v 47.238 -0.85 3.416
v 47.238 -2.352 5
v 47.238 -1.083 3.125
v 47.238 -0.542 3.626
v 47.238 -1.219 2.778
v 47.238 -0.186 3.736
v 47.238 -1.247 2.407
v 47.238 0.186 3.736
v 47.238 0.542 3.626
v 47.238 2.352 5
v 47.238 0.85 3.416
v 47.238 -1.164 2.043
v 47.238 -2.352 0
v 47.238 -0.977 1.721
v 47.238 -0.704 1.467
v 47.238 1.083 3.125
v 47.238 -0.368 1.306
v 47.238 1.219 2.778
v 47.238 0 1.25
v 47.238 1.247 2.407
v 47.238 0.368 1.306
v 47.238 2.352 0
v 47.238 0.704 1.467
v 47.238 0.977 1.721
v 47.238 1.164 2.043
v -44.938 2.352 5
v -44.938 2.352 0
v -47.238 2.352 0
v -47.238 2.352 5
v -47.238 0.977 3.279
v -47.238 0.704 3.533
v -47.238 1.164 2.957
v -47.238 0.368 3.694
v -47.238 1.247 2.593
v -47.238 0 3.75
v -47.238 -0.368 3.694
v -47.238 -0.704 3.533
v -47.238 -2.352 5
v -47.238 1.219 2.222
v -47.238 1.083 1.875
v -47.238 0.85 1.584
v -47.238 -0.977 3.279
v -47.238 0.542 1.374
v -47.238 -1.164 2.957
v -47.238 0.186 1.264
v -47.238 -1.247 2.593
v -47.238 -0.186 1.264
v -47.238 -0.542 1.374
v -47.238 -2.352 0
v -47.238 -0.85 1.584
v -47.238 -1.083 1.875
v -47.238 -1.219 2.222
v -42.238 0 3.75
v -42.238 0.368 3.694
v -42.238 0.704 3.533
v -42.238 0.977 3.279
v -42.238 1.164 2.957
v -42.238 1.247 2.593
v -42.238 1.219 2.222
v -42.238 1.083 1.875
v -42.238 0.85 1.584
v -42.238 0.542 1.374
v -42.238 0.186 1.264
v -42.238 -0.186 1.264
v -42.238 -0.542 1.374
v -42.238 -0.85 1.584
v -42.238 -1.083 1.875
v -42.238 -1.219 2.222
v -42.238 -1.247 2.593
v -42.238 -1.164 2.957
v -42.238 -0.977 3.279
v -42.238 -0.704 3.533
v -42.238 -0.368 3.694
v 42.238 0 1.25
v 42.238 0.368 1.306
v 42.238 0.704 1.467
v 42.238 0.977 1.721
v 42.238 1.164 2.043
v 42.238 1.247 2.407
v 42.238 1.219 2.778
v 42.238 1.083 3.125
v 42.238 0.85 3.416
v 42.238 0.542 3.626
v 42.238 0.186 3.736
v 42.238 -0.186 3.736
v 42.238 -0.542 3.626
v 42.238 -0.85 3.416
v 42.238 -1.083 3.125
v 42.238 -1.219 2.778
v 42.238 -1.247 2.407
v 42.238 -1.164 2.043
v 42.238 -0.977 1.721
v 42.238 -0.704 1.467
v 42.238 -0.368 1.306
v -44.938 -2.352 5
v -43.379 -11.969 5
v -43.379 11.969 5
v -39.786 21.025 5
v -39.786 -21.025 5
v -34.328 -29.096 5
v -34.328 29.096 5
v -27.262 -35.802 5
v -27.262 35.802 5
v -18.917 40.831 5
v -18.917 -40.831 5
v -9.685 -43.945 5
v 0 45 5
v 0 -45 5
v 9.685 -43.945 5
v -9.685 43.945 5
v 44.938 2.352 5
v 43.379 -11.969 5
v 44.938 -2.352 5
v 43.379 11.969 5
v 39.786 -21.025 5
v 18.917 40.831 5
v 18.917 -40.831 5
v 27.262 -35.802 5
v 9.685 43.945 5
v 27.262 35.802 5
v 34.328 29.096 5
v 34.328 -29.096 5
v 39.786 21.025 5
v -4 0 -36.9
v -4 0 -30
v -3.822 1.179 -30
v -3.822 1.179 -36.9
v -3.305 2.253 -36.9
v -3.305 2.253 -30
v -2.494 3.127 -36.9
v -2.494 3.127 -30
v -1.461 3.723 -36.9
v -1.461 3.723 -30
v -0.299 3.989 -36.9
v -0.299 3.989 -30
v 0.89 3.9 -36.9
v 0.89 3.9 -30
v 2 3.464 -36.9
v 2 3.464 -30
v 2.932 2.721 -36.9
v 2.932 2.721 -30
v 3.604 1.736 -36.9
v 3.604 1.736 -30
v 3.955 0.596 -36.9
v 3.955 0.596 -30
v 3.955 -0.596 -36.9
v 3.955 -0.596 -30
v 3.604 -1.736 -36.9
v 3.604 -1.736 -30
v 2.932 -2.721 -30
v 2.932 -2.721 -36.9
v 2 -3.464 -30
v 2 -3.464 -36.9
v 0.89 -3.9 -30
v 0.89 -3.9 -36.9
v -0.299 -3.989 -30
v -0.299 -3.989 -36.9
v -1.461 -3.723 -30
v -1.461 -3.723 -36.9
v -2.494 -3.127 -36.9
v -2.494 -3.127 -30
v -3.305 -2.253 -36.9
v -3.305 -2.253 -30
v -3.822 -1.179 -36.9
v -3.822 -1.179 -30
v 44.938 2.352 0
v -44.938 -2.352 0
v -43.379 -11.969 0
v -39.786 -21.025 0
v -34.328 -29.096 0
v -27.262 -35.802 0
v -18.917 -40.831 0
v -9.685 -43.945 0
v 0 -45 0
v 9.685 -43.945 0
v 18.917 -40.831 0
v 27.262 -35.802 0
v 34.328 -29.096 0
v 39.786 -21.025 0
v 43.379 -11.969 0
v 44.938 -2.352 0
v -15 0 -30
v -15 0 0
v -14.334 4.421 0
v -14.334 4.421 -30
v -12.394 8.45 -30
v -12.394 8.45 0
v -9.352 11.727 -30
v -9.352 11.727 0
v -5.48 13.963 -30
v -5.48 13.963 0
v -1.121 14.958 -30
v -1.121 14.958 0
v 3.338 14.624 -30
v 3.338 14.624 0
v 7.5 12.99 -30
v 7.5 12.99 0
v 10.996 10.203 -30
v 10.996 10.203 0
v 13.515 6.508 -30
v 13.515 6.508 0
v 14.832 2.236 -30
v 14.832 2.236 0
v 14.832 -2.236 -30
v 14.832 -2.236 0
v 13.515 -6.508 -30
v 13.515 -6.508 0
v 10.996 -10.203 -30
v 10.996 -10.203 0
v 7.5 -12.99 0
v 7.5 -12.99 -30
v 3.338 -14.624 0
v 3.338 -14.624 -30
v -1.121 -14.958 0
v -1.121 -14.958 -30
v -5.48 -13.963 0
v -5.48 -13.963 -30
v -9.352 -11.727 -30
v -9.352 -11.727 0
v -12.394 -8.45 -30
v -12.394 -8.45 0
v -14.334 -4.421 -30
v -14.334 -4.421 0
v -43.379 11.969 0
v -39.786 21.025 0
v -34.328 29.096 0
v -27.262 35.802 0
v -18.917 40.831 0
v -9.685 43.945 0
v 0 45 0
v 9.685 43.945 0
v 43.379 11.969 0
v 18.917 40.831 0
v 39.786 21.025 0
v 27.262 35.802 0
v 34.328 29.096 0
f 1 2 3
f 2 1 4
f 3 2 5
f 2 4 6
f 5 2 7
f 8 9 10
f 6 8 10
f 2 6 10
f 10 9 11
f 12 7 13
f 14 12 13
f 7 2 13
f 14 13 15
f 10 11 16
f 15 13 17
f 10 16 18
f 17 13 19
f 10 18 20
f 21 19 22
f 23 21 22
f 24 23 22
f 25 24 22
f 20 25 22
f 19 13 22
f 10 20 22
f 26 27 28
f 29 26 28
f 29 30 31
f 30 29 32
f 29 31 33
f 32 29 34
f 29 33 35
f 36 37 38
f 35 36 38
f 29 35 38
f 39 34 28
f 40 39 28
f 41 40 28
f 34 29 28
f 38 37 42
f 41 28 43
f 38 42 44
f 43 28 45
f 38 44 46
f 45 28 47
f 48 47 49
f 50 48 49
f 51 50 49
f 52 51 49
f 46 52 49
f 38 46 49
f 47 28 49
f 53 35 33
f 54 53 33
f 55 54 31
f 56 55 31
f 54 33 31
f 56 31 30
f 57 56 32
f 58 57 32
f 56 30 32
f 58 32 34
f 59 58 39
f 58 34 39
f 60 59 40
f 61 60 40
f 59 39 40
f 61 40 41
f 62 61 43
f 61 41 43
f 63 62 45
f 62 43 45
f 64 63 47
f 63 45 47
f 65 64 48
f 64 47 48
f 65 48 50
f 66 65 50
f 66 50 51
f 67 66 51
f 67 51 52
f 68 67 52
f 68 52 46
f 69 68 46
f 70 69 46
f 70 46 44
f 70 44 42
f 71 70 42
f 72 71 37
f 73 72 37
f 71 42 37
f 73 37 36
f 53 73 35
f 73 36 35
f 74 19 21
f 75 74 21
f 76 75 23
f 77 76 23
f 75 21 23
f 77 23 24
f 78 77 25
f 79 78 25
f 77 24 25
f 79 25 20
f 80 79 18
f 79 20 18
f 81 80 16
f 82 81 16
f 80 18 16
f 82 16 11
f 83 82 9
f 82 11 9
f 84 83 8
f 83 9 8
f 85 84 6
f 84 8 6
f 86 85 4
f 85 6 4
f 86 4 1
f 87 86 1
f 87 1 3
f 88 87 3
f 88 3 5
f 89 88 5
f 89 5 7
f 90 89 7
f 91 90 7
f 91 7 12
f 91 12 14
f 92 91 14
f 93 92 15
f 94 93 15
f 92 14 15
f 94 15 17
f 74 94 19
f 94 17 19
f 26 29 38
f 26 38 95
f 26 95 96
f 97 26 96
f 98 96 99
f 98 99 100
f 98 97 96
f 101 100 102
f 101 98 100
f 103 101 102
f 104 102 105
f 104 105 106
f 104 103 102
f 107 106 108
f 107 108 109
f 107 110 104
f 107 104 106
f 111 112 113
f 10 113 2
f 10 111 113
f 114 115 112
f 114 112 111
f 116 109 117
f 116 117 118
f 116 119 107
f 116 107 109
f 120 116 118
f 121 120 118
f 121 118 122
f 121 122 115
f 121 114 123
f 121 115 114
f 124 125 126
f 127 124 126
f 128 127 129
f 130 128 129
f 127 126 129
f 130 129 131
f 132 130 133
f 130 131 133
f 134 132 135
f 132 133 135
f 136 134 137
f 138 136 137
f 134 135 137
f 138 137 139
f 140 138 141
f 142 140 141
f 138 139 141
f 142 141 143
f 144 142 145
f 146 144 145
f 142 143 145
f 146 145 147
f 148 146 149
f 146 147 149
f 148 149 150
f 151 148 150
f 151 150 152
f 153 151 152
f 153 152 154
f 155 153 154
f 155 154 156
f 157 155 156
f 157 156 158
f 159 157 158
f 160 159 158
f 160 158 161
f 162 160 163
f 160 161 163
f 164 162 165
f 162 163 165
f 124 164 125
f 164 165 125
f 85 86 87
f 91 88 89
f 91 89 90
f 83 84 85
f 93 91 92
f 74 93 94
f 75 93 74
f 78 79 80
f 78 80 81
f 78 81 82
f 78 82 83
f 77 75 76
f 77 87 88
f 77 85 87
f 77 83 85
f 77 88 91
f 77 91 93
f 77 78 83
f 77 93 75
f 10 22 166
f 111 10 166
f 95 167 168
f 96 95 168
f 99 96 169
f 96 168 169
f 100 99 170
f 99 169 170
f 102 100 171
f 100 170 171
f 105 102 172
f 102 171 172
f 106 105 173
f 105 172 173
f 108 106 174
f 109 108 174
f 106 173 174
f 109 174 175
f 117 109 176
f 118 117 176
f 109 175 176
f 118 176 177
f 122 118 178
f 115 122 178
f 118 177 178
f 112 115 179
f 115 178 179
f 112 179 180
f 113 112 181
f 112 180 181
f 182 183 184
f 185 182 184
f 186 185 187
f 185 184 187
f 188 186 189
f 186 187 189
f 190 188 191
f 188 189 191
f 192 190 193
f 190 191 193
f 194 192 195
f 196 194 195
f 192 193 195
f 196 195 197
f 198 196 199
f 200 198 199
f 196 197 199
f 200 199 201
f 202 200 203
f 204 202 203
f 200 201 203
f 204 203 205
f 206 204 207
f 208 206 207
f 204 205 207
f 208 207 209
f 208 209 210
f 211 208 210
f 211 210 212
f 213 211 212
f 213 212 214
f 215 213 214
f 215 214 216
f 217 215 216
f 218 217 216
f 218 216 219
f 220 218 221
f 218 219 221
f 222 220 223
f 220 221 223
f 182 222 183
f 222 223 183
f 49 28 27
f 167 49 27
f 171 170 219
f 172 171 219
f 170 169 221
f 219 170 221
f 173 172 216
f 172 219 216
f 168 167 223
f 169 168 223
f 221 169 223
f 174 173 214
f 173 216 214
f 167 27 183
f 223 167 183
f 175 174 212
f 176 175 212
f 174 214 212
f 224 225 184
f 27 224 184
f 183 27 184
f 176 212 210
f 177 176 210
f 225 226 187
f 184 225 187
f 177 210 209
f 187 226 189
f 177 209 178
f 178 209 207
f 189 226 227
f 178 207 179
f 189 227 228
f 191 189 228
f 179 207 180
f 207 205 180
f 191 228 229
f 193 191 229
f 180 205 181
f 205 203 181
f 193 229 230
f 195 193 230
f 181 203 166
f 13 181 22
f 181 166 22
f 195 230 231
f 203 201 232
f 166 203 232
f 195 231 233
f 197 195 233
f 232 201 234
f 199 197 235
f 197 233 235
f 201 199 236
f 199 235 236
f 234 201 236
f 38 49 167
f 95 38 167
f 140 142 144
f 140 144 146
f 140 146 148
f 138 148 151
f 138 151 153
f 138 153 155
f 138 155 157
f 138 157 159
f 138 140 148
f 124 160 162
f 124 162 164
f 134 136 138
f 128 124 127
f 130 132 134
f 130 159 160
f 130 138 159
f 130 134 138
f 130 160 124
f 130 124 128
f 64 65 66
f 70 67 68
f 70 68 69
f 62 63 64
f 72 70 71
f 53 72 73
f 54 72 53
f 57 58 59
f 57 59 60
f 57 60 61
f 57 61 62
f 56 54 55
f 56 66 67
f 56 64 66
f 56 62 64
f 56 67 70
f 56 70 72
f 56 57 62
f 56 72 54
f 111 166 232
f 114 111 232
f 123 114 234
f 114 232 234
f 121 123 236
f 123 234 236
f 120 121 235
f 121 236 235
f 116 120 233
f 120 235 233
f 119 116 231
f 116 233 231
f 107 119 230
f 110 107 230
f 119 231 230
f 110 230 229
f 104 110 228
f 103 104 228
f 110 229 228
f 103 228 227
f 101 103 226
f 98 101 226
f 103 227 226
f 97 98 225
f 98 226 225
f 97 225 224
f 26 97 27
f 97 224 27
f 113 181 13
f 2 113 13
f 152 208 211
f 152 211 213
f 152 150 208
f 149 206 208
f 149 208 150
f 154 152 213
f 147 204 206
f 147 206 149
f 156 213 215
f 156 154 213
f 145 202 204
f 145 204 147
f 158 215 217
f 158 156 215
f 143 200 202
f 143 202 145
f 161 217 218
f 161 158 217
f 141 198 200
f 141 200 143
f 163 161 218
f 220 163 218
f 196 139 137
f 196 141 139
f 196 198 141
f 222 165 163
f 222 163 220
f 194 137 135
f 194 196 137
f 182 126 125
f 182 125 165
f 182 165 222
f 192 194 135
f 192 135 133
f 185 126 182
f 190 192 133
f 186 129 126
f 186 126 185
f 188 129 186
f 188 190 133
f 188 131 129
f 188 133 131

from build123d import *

# Parameters (mm, degrees)
BOSS_EXTRUDE2_DEPTH = 5
SKETCH6_R           = 15
BOSS_EXTRUDE3_DEPTH = 30
SKETCH7_R           = 4
BOSS_EXTRUDE4_DEPTH = 6.9
SKETCH8_R           = 1.25
CUT_EXTRUDE1_DEPTH  = 5
SKETCH9_R           = 1.25
CUT_EXTRUDE2_DEPTH  = 5


with BuildPart() as part:
    # Sketch5 → Boss-Extrude2 (new body)
    with BuildSketch(Plane.XY):
        with BuildLine():
            Line((-44.938485198, 2.352136924), (-47.238485198, 2.352136924))
            Line((-47.238485198, 2.352136924), (-47.238485198, -2.352136924))
            Line((-47.238485198, -2.352136924), (-44.938485198, -2.352136924))
            ThreePointArc((-44.938485198, -2.352136924), (0, -45), (44.938485198, -2.352136924))
            Line((44.938485198, -2.352136924), (47.238485198, -2.352136924))
            Line((47.238485198, -2.352136924), (47.238485198, 2.352136924))
            Line((47.238485198, 2.352136924), (44.938485198, 2.352136924))
            ThreePointArc((44.938485198, 2.352136924), (0, 45), (-44.938485198, 2.352136924))
        make_face()
    extrude(amount=BOSS_EXTRUDE2_DEPTH)

    # Sketch6 → Boss-Extrude3 (add)
    with BuildSketch(Plane(origin=(0, 0, 0), x_dir=(-1, 0, 0), z_dir=(0, 0, -1))):
        Circle(SKETCH6_R)
    extrude(amount=BOSS_EXTRUDE3_DEPTH)

    # Sketch7 → Boss-Extrude4 (add)
    with BuildSketch(Plane(origin=(0, 0, -30), x_dir=(-1, 0, 0), z_dir=(0, 0, -1))):
        Circle(SKETCH7_R)
    extrude(amount=BOSS_EXTRUDE4_DEPTH)

    # Sketch8 → Cut-Extrude1 (cut)
    with BuildSketch(Plane(origin=(47.238485198, 0, 0), x_dir=(0, 0, -1), z_dir=(1, 0, 0))):
        with Locations((-2.5, 0)):
            Circle(SKETCH8_R)
    extrude(amount=-CUT_EXTRUDE1_DEPTH, mode=Mode.SUBTRACT)

    # Sketch9 → Cut-Extrude2 (cut)
    with BuildSketch(Plane.ZY.offset(47.238485198)):
        with Locations((2.5, 0)):
            Circle(SKETCH9_R)
    extrude(amount=-CUT_EXTRUDE2_DEPTH, mode=Mode.SUBTRACT)


solid = part.part
